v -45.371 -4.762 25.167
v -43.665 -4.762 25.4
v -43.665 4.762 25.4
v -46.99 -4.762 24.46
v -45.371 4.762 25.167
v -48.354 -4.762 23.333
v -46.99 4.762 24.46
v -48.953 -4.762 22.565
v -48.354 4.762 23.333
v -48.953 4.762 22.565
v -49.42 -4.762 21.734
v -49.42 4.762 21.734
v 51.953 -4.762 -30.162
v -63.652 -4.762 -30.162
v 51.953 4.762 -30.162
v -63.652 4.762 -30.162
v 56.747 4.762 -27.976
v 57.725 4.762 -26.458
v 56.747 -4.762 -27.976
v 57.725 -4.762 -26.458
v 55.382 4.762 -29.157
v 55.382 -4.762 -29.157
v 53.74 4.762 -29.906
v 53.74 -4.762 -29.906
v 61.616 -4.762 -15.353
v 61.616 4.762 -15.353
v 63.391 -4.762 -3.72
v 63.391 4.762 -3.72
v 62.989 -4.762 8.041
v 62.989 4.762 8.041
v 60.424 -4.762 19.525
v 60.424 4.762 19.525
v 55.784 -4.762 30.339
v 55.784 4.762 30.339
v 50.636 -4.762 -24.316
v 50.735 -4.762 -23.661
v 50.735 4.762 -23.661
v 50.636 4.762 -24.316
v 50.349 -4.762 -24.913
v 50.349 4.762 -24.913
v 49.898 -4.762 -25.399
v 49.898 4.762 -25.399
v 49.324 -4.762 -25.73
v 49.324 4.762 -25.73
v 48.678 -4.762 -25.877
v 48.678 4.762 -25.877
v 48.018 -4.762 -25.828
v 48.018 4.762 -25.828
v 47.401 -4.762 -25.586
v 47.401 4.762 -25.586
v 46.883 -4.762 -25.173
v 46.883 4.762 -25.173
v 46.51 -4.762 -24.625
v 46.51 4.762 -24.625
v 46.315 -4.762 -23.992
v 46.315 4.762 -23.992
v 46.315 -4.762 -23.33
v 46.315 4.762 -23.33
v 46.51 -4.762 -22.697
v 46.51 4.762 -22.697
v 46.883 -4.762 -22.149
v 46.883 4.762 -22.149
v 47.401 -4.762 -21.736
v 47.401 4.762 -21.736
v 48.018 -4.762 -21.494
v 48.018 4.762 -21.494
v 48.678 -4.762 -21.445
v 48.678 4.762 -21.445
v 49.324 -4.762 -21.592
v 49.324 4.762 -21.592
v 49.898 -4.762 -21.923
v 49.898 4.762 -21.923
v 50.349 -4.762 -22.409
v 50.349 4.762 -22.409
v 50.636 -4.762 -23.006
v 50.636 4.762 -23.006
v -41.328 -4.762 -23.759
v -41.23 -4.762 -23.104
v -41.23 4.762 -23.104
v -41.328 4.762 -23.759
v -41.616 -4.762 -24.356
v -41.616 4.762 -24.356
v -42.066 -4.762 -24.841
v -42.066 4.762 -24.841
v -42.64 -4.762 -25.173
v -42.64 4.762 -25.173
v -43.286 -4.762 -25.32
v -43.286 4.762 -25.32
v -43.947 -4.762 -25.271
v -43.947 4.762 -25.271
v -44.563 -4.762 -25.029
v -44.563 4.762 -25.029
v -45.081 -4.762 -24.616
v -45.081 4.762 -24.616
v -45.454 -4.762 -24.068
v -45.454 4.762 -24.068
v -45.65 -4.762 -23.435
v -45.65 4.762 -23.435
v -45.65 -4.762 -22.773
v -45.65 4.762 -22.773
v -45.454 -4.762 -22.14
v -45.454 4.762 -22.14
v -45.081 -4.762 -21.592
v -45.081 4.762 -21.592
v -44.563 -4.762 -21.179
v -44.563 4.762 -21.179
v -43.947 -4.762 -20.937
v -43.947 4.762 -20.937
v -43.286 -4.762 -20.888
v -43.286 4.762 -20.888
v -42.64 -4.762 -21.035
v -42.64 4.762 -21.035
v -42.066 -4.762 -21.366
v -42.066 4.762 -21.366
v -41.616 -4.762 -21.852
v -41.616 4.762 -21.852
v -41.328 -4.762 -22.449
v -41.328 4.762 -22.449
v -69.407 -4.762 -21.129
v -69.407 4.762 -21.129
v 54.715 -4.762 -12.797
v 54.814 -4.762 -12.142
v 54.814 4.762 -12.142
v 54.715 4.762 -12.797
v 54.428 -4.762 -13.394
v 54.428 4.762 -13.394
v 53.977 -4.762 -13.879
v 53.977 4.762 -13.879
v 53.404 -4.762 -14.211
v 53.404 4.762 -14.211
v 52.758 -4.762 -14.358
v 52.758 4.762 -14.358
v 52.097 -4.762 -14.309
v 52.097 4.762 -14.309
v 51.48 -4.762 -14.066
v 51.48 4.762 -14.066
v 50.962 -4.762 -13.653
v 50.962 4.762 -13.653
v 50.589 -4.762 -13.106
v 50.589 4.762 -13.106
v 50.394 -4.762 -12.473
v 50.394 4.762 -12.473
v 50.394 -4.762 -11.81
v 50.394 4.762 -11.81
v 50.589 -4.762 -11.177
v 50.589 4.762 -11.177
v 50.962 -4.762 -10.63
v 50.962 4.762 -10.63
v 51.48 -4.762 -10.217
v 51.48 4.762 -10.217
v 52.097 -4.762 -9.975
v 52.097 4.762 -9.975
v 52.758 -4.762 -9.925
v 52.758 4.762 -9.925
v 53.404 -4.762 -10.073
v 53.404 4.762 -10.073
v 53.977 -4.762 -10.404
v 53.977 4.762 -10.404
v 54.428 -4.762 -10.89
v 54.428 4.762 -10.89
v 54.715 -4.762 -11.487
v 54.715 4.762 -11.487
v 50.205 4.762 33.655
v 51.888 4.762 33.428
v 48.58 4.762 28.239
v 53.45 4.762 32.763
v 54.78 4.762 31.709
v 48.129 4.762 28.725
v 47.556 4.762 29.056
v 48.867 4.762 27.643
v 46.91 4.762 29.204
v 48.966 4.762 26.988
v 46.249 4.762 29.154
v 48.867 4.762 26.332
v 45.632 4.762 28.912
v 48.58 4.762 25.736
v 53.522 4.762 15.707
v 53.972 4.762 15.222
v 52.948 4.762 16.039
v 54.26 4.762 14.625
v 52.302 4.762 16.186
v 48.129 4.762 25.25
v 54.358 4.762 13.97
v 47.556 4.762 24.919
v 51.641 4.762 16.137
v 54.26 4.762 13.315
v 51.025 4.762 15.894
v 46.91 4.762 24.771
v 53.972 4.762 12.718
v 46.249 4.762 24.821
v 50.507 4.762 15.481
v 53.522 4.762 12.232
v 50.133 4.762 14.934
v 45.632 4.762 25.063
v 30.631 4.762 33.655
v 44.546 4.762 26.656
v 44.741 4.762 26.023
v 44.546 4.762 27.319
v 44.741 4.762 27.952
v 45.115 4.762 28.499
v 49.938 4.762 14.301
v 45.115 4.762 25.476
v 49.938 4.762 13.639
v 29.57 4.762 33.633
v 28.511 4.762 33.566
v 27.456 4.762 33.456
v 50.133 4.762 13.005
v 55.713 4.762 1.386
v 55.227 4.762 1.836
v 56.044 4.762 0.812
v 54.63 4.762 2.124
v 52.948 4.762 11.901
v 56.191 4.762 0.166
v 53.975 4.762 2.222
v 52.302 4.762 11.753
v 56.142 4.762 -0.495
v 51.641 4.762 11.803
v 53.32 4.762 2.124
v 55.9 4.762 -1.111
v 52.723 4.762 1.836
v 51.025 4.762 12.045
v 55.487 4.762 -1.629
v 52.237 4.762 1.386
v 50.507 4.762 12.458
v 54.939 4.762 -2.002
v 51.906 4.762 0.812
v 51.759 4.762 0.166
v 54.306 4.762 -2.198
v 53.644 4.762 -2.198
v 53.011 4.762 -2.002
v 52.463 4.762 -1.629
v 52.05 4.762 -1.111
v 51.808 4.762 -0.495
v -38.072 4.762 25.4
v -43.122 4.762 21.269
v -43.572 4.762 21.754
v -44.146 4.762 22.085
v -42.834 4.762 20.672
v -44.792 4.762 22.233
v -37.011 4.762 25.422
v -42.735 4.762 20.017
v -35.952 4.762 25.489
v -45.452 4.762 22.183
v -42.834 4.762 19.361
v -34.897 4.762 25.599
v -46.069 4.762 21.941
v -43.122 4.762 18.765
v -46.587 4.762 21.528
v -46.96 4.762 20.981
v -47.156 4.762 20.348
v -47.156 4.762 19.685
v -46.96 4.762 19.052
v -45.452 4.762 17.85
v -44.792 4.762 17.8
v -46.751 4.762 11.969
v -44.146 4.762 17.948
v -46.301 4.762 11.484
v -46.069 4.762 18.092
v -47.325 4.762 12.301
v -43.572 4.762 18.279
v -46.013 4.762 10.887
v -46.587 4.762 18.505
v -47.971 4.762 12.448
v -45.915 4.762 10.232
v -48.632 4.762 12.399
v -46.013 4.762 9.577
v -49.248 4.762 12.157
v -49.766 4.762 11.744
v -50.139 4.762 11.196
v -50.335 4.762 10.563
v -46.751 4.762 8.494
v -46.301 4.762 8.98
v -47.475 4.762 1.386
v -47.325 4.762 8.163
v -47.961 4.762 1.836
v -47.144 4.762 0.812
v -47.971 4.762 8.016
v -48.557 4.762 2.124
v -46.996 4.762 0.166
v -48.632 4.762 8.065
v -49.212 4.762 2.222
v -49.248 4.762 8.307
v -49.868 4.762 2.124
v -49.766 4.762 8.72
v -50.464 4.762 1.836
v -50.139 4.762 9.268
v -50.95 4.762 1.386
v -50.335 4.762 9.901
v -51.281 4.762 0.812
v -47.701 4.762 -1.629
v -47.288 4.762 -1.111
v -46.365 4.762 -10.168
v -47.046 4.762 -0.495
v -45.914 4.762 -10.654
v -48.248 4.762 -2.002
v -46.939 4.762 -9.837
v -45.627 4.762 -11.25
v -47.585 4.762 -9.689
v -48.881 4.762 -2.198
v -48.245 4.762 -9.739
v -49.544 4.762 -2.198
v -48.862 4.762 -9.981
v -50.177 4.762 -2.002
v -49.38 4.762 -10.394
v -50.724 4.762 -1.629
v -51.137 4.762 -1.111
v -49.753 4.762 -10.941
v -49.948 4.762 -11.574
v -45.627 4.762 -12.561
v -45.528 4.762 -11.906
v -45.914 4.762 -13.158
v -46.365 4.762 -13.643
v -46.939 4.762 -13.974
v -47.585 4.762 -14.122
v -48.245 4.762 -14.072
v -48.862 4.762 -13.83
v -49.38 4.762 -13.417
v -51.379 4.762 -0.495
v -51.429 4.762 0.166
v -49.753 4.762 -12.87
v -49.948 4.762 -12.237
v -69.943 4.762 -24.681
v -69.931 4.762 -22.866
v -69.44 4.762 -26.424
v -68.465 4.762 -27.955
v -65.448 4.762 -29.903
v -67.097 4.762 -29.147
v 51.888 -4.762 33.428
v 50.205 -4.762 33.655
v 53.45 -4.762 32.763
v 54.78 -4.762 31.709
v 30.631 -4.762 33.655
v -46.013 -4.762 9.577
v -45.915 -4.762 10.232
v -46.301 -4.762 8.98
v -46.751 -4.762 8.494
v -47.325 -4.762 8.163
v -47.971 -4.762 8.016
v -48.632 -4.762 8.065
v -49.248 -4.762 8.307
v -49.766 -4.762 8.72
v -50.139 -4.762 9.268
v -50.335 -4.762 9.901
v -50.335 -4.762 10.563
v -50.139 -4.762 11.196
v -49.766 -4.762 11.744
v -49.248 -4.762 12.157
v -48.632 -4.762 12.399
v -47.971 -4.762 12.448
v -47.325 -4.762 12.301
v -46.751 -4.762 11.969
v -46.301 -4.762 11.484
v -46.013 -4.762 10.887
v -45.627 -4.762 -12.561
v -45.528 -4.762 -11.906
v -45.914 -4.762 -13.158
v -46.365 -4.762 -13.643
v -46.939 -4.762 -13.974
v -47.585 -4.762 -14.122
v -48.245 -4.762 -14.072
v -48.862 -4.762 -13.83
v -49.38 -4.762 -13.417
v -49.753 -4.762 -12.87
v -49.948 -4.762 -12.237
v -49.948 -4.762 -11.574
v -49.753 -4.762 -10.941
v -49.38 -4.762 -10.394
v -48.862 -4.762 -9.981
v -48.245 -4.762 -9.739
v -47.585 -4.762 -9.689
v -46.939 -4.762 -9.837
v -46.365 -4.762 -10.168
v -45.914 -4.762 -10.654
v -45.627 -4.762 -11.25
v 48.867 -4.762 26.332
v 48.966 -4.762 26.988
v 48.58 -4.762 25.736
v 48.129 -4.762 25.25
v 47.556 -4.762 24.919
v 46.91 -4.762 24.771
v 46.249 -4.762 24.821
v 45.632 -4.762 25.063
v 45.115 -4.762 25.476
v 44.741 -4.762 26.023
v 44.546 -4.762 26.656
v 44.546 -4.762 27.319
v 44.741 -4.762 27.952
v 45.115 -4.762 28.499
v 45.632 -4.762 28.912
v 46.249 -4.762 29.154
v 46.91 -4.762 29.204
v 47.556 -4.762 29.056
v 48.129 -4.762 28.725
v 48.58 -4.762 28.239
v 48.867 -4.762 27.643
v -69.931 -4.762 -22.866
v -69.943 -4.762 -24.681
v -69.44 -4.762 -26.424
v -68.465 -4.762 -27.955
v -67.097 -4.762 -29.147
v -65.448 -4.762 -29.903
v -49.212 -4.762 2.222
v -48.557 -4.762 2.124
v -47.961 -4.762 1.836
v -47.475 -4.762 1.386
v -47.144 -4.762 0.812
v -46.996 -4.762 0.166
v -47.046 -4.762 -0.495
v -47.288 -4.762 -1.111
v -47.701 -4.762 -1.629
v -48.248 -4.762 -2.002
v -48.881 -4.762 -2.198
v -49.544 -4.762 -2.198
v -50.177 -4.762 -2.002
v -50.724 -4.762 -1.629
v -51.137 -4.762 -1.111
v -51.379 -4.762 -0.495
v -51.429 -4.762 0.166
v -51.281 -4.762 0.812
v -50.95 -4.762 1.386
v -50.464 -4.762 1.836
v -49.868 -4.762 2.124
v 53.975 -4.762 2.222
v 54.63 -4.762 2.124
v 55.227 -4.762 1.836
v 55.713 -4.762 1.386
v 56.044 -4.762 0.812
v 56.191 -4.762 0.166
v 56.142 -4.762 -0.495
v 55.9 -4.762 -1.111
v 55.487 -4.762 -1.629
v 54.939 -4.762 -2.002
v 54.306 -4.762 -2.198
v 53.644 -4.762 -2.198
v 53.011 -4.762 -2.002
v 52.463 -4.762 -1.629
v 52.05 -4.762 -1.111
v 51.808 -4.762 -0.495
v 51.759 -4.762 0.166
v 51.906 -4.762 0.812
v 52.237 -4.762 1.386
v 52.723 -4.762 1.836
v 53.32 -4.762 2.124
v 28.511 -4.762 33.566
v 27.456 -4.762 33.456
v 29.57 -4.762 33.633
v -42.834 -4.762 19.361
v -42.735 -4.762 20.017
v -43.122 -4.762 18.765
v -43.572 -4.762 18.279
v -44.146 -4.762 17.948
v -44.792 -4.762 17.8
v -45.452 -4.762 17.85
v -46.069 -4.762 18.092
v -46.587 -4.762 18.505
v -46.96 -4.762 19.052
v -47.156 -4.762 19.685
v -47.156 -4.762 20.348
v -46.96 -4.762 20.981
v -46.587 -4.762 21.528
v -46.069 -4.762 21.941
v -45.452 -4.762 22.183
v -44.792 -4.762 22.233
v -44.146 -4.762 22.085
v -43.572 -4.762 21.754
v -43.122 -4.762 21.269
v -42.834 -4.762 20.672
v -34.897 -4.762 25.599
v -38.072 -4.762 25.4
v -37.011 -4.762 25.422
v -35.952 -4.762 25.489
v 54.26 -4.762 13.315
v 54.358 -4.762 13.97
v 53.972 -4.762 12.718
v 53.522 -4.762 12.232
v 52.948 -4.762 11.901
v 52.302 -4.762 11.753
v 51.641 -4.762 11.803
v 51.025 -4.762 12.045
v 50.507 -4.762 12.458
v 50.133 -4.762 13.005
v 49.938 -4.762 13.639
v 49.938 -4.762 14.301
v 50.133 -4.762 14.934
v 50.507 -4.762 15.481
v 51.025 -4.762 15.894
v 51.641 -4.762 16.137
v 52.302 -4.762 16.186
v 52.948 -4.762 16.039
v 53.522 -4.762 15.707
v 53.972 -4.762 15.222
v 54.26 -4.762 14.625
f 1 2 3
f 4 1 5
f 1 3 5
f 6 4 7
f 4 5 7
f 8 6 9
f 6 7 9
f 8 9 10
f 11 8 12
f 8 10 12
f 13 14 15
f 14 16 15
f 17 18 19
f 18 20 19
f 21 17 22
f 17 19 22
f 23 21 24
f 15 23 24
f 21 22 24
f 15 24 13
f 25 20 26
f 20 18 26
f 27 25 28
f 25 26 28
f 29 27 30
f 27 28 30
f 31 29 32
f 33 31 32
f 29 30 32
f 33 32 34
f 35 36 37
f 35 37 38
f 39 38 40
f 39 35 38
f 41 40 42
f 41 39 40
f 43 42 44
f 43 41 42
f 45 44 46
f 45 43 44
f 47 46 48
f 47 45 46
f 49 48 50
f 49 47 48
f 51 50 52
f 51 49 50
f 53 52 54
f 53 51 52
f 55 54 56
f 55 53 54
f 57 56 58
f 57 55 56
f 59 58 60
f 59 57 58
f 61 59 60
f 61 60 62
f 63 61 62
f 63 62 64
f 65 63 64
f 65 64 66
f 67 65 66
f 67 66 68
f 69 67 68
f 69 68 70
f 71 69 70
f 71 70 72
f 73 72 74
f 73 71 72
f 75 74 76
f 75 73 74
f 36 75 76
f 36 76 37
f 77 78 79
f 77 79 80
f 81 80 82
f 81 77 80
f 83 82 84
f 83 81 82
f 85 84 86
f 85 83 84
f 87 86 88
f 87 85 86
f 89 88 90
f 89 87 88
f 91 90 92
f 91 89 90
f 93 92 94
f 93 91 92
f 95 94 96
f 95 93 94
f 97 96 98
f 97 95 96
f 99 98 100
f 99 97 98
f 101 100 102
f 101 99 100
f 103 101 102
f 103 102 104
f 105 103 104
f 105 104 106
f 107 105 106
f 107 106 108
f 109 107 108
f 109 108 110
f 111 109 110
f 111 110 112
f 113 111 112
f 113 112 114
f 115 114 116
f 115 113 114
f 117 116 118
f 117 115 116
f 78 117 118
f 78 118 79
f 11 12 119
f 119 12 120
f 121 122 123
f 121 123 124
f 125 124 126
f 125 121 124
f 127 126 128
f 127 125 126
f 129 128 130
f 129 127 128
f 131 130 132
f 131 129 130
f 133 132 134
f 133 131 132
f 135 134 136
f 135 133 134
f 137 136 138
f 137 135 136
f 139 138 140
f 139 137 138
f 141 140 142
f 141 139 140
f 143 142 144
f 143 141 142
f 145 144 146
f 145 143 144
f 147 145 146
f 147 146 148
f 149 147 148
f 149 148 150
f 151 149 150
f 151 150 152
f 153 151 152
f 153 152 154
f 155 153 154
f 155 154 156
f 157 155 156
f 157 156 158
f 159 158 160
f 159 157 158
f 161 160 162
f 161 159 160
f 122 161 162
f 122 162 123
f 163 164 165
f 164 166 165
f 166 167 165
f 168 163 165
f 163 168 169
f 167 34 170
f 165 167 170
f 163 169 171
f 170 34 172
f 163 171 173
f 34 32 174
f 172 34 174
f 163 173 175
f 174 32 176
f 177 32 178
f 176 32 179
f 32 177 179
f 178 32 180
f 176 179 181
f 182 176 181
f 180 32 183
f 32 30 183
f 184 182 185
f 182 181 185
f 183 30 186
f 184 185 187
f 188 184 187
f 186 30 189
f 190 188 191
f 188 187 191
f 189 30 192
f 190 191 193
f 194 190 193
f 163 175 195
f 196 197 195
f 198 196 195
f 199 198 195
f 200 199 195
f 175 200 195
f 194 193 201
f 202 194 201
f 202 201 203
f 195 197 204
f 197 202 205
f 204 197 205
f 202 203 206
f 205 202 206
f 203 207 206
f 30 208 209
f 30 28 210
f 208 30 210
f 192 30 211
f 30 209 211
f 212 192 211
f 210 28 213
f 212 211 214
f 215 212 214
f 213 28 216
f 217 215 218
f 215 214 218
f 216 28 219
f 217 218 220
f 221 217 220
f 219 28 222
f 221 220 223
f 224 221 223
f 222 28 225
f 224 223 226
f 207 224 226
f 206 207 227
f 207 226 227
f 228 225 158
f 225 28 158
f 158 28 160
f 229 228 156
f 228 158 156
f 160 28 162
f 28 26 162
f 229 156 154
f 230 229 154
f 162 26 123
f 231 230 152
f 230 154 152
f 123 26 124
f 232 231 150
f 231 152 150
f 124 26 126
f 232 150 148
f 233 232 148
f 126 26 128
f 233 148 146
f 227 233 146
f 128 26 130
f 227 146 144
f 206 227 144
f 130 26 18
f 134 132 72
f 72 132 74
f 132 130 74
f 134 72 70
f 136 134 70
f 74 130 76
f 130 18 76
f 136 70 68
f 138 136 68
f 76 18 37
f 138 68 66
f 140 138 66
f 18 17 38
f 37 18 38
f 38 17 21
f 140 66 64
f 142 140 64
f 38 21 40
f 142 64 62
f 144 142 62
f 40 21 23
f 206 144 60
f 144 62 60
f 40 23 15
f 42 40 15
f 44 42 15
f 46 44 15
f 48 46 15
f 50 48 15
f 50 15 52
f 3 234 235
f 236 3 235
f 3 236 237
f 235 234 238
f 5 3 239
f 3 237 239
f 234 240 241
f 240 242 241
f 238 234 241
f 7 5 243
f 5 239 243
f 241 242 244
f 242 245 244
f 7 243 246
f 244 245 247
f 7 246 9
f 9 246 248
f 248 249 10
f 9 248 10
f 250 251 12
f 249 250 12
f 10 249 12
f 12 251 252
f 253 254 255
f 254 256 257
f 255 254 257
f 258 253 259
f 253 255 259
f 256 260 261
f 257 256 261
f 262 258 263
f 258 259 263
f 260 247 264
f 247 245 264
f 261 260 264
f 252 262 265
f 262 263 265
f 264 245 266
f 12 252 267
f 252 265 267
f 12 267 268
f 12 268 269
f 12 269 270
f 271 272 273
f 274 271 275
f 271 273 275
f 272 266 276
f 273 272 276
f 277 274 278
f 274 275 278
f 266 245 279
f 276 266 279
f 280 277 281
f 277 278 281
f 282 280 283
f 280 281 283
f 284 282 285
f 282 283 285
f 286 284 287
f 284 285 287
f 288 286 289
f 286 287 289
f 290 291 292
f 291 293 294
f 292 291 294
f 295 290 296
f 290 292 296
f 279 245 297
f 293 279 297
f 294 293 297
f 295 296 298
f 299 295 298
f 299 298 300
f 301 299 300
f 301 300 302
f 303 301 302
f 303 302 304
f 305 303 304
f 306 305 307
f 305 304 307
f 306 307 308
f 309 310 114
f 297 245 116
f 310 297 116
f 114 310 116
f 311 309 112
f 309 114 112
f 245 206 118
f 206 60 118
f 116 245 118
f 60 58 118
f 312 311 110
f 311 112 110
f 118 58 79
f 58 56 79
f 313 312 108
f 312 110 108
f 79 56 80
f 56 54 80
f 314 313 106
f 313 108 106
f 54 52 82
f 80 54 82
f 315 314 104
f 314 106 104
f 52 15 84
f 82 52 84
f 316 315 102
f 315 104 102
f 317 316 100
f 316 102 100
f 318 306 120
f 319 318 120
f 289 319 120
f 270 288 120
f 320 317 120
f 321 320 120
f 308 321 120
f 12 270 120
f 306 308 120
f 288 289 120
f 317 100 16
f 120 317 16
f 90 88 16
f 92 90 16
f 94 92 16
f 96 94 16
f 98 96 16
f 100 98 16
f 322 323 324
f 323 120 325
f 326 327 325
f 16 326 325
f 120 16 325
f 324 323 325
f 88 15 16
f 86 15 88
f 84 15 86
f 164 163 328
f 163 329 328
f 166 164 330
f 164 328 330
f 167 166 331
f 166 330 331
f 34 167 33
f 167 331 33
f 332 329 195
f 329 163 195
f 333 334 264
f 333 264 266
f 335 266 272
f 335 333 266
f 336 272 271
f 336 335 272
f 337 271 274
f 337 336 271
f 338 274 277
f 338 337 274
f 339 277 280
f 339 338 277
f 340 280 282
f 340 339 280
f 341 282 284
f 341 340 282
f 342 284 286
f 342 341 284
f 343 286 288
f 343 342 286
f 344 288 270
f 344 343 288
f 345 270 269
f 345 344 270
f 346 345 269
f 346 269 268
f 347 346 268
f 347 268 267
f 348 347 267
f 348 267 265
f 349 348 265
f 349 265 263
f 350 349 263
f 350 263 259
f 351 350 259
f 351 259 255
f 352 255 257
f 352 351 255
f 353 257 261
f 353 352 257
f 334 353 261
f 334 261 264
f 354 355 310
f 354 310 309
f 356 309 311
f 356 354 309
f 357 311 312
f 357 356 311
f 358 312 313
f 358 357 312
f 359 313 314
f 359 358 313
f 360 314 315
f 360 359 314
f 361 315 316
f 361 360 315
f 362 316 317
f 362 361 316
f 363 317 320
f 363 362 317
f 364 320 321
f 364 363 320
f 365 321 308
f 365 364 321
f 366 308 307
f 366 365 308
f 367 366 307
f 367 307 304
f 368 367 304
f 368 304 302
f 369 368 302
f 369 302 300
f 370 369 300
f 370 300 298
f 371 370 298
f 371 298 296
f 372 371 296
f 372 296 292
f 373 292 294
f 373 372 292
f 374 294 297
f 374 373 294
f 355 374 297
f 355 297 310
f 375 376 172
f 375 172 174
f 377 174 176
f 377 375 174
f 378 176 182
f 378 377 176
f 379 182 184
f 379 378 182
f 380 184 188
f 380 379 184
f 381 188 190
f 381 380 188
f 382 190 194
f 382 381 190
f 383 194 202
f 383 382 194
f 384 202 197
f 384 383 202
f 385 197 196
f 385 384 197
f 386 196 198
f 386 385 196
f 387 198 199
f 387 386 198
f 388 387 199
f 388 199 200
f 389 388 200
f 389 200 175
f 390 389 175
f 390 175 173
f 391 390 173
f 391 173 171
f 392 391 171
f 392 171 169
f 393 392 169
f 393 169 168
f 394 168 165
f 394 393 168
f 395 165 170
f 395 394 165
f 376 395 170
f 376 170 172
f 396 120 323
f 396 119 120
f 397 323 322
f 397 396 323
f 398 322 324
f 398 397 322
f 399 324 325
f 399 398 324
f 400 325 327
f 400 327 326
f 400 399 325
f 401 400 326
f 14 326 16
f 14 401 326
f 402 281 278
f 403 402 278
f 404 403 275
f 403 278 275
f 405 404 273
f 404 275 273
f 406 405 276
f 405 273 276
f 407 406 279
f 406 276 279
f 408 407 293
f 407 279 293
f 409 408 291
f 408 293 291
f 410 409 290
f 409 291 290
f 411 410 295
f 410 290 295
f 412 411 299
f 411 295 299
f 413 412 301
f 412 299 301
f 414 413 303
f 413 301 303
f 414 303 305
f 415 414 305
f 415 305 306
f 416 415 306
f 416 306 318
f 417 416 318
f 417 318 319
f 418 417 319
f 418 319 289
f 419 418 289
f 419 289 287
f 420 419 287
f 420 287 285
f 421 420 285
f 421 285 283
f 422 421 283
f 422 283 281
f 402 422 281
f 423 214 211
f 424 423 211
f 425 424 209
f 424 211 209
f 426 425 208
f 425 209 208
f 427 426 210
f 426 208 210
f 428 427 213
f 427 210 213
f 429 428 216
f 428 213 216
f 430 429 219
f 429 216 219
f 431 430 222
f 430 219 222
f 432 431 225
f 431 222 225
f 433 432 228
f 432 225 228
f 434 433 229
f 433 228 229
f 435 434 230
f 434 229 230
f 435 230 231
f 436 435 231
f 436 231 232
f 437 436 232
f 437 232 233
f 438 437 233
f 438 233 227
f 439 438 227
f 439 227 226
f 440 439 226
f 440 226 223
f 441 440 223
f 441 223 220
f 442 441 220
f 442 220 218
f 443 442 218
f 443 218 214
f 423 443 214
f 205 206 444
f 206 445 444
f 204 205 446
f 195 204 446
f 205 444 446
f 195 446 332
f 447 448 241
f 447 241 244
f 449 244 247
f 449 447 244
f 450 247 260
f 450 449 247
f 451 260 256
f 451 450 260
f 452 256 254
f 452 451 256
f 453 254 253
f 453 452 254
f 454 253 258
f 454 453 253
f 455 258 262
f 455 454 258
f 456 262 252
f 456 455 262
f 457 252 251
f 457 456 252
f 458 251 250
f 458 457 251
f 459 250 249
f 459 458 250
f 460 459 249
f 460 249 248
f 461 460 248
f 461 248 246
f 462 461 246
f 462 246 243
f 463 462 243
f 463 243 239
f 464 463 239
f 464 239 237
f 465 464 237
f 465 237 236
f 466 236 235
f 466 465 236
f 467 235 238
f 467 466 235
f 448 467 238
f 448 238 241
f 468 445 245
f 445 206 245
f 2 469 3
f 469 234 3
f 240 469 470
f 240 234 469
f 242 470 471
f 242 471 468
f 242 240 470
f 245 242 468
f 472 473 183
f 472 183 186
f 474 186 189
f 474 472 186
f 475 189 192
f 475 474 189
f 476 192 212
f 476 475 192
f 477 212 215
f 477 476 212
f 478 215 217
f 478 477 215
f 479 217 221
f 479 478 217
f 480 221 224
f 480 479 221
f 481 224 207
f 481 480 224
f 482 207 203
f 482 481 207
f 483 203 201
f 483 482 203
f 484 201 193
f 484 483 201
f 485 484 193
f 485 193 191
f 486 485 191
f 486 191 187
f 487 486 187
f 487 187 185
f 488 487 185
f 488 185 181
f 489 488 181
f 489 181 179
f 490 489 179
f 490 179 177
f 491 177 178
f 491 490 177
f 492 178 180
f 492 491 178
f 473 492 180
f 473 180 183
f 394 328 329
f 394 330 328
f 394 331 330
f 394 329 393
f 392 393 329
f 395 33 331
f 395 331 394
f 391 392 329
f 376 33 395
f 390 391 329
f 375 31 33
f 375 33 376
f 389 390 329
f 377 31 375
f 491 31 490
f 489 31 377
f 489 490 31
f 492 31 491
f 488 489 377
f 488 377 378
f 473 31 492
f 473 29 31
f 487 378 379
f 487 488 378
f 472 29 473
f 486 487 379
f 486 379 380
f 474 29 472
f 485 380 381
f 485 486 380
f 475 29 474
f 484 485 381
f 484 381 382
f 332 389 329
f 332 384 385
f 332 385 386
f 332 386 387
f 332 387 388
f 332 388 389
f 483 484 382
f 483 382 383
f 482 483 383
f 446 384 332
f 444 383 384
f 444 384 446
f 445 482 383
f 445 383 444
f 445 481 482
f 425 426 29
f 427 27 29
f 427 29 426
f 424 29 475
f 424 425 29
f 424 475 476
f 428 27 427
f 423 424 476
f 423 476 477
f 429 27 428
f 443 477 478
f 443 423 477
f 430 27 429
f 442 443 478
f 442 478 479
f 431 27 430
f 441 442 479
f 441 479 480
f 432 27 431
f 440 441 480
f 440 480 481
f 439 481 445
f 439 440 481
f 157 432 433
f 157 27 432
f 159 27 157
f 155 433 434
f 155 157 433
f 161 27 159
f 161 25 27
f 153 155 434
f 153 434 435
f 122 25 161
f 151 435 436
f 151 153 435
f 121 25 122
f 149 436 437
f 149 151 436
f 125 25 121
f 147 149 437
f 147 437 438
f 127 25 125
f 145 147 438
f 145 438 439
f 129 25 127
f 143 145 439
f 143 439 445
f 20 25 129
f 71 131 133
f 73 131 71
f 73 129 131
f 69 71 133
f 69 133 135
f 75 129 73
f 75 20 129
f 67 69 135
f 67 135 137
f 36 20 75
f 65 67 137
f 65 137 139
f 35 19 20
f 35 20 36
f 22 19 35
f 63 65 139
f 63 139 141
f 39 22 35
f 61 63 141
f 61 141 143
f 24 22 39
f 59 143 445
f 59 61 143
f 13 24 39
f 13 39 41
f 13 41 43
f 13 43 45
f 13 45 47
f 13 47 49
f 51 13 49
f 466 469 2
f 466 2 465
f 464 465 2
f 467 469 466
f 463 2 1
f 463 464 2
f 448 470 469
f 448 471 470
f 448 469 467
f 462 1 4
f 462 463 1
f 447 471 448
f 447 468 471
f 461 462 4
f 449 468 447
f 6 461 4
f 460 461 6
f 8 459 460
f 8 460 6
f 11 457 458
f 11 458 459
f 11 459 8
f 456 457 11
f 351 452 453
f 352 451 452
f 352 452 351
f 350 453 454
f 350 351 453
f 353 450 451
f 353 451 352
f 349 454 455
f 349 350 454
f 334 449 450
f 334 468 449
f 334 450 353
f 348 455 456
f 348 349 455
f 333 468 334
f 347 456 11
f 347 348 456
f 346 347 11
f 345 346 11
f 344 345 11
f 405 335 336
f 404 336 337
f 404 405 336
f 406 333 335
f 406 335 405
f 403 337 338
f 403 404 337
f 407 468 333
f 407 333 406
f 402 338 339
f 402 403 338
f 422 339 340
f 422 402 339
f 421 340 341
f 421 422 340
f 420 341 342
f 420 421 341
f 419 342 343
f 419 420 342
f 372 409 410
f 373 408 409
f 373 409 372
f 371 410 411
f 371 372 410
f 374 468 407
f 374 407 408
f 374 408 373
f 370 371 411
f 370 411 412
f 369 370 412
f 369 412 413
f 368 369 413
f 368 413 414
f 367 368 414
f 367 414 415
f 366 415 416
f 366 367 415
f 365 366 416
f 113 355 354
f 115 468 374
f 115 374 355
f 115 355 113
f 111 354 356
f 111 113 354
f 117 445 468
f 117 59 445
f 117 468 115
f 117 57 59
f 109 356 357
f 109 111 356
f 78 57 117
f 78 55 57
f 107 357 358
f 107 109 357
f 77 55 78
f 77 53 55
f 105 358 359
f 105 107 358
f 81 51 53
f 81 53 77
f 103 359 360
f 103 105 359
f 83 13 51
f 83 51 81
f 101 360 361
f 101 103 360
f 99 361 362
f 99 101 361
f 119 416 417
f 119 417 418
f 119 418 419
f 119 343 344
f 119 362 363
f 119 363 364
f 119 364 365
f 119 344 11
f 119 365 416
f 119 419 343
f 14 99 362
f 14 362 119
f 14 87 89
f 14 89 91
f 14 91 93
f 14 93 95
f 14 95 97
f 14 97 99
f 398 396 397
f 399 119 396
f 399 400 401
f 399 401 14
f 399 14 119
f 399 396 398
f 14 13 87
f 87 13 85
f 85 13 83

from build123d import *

# Parameters (mm, degrees)
BOSS_EXTRUDE1_DEPTH   = 4.7625
SKETCH2_R             = 2.2225
CUT_EXTRUDE1_DEPTH    = 73.495756083
SKETCH3_R             = 2.2225
CUT_EXTRUDE2_DEPTH    = 73.495756083
CIRPATTERN1_START     = -4.7625
CIRPATTERN1_OUTLINE_R = 2.2225
CIRPATTERN1_DEPTH     = 9.525
CIRPATTERN2_START     = -4.7625
CIRPATTERN2_OUTLINE_R = 2.2225
CIRPATTERN2_DEPTH     = 9.525
BOSS_EXTRUDE2_DEPTH   = 9.525
FILLET1_R             = 6.35
FILLET2_R             = 25.4


# Read off the part's stored shape, not the designer's step: CirPattern1, CirPattern2
with BuildPart() as part:
    # Sketch1 → Boss-Extrude1 (new, symmetric)
    with BuildSketch(Plane(origin=(0, 0, 0), x_dir=(1, 0, 0), z_dir=(0, 1, 0))):
        with BuildLine():
            Line((-44.760744171, 30.1625), (55.879098004, 30.1625))
            ThreePointArc((55.879098004, 30.1625), (63.467858945, -2.02011904), (53.847850236, -33.655))
            Line((53.847850236, -33.655), (29.036932948, -33.655))
            Line((29.036932948, -33.655), (-36.477972806, -25.4))
            Line((-36.477972806, -25.4), (-47.625, -25.4))
            ThreePointArc((-47.625, -25.4), (-53.903425523, 2.778730272), (-44.760744171, 30.1625))
        make_face()
    extrude(amount=BOSS_EXTRUDE1_DEPTH, both=True)

    # Sketch2 → Cut-Extrude1 (cut, through all)
    with BuildSketch(Plane(origin=(0, 4.7625, 0), x_dir=(1, 0, 0), z_dir=(0, 1, 0))):
        with Locations(Location((-49.2125, 0, 0), (0, 0, 270))):
            Circle(SKETCH2_R)
    extrude(amount=-CUT_EXTRUDE1_DEPTH, mode=Mode.SUBTRACT)

    # Sketch3 → Cut-Extrude2 (cut, through all)
    with BuildSketch(Plane(origin=(0, 4.7625, 0), x_dir=(1, 0, 0), z_dir=(0, 1, 0))):
        with Locations(Location((53.975, 0, 0), (0, 0, 270))):
            Circle(SKETCH3_R)
    extrude(amount=-CUT_EXTRUDE2_DEPTH, mode=Mode.SUBTRACT)

    # CirPattern1 outline → CirPattern1 (cut)
    with BuildSketch(Plane(origin=(0, 0, 0), x_dir=(1, 0, 0), z_dir=(0, 1, 0)).offset(CIRPATTERN1_START)):
        with Locations((-47.750678429, 11.905581287)):
            Circle(CIRPATTERN1_OUTLINE_R)
        with Locations((-43.452058414, 23.103869284)):
            Circle(CIRPATTERN1_OUTLINE_R)
        with Locations((-48.137088801, -10.231854084)):
            Circle(CIRPATTERN1_OUTLINE_R)
        with Locations((-44.957855834, -20.016527047)):
            Circle(CIRPATTERN1_OUTLINE_R)
    extrude(amount=CIRPATTERN1_DEPTH, mode=Mode.SUBTRACT)

    # CirPattern2 outline → CirPattern2 (cut)
    with BuildSketch(Plane(origin=(0, 0, 0), x_dir=(1, 0, 0), z_dir=(0, 1, 0)).offset(CIRPATTERN2_START)):
        with Locations((52.591624247, 12.141733158)):
            Circle(CIRPATTERN2_OUTLINE_R)
        with Locations((48.512408649, 23.661082648)):
            Circle(CIRPATTERN2_OUTLINE_R)
        with Locations((52.135846474, -13.969757959)):
            Circle(CIRPATTERN2_OUTLINE_R)
        with Locations((46.743721169, -26.9875)):
            Circle(CIRPATTERN2_OUTLINE_R)
    extrude(amount=CIRPATTERN2_DEPTH, mode=Mode.SUBTRACT)

    # Sketch4 → Boss-Extrude2 (add, through all)
    with BuildSketch(Plane(origin=(0, 4.7625, 0), x_dir=(1, 0, 0), z_dir=(0, 1, 0))):
        with BuildLine():
            Line((-48.917962805, -22.810820677), (-73.619827915, 30.1625))
            Line((-73.619827915, 30.1625), (-44.760744171, 30.1625))
            ThreePointArc((-44.760744171, 30.1625), (-53.809555017, 4.222844291), (-48.917962805, -22.810820677))
        make_face()
    extrude(amount=-BOSS_EXTRUDE2_DEPTH)

    # Fillet1
    fillet1_edges = [part.edges().sort_by_distance(p)[0] for p in [
        (55.879098004, 0, -30.1625),
        (53.847850236, 0, 33.655),
        (-47.625, 0, 25.4),
        (-73.619827915, 0, -30.1625),
    ]]
    fillet(fillet1_edges, radius=FILLET1_R)

    # Fillet2
    fillet2_edges = [part.edges().sort_by_distance(p)[0] for p in [
        (29.036932948, 0, 33.655),
        (-36.477972806, 0, 25.4),
    ]]
    fillet(fillet2_edges, radius=FILLET2_R)


solid = part.part
